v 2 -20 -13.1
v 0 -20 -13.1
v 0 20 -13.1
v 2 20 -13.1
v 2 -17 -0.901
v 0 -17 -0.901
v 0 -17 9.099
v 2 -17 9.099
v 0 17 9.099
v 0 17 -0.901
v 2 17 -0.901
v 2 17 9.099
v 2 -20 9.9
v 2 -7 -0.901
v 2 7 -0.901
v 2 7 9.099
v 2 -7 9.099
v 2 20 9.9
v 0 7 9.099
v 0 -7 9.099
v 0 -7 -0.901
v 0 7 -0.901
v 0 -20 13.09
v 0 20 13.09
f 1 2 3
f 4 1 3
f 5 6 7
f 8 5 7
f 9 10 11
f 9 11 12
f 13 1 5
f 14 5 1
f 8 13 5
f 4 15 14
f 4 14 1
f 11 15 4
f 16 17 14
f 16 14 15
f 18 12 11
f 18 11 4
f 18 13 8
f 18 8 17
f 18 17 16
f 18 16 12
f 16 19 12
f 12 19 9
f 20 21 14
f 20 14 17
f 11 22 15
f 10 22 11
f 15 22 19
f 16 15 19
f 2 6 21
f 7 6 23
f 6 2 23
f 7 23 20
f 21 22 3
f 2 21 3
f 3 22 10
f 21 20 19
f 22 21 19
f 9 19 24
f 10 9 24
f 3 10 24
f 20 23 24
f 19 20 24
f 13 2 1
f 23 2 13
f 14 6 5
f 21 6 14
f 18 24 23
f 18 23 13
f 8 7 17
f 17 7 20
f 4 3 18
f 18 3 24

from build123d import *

# Parameters (mm, degrees)
F0_W        = 40
F0_H        = 26.199
F0_W_2      = 10
F0_H_2      = 10
F1_DEPTH    = 2
F2_T1_DEPTH = 56.5405413216


# Not quite as in the source:
# - a fillet or chamfer that OpenCascade refuses, or shapes differently, is made with other operations: its cross-section is extruded or revolved along the edge and cut away or added


with BuildPart() as f1:
    # F0 (on Right) → F1 (new body)
    with BuildSketch(Plane.YZ):
        Rectangle(F0_W, F0_H)
        with Locations((-12, 4.0995)):
            Rectangle(F0_W_2, F0_H_2, mode=Mode.SUBTRACT)
        with Locations((12, 4.0995)):
            Rectangle(F0_W_2, F0_H_2, mode=Mode.SUBTRACT)
    extrude(amount=F1_DEPTH)

    # F2: chamfer of 3.199 x 2.005940846 on 1 edges, made by hand

    # F2_s2 → F2_t1 (cut)
    with BuildSketch(Plane.XZ.offset(-28.2702706608)):
        Polygon((-0.005940846, 13.0995), (2, 9.9005), (2, 13.0995), align=None)
    extrude(amount=F2_T1_DEPTH, mode=Mode.SUBTRACT)


solid = f1.part
